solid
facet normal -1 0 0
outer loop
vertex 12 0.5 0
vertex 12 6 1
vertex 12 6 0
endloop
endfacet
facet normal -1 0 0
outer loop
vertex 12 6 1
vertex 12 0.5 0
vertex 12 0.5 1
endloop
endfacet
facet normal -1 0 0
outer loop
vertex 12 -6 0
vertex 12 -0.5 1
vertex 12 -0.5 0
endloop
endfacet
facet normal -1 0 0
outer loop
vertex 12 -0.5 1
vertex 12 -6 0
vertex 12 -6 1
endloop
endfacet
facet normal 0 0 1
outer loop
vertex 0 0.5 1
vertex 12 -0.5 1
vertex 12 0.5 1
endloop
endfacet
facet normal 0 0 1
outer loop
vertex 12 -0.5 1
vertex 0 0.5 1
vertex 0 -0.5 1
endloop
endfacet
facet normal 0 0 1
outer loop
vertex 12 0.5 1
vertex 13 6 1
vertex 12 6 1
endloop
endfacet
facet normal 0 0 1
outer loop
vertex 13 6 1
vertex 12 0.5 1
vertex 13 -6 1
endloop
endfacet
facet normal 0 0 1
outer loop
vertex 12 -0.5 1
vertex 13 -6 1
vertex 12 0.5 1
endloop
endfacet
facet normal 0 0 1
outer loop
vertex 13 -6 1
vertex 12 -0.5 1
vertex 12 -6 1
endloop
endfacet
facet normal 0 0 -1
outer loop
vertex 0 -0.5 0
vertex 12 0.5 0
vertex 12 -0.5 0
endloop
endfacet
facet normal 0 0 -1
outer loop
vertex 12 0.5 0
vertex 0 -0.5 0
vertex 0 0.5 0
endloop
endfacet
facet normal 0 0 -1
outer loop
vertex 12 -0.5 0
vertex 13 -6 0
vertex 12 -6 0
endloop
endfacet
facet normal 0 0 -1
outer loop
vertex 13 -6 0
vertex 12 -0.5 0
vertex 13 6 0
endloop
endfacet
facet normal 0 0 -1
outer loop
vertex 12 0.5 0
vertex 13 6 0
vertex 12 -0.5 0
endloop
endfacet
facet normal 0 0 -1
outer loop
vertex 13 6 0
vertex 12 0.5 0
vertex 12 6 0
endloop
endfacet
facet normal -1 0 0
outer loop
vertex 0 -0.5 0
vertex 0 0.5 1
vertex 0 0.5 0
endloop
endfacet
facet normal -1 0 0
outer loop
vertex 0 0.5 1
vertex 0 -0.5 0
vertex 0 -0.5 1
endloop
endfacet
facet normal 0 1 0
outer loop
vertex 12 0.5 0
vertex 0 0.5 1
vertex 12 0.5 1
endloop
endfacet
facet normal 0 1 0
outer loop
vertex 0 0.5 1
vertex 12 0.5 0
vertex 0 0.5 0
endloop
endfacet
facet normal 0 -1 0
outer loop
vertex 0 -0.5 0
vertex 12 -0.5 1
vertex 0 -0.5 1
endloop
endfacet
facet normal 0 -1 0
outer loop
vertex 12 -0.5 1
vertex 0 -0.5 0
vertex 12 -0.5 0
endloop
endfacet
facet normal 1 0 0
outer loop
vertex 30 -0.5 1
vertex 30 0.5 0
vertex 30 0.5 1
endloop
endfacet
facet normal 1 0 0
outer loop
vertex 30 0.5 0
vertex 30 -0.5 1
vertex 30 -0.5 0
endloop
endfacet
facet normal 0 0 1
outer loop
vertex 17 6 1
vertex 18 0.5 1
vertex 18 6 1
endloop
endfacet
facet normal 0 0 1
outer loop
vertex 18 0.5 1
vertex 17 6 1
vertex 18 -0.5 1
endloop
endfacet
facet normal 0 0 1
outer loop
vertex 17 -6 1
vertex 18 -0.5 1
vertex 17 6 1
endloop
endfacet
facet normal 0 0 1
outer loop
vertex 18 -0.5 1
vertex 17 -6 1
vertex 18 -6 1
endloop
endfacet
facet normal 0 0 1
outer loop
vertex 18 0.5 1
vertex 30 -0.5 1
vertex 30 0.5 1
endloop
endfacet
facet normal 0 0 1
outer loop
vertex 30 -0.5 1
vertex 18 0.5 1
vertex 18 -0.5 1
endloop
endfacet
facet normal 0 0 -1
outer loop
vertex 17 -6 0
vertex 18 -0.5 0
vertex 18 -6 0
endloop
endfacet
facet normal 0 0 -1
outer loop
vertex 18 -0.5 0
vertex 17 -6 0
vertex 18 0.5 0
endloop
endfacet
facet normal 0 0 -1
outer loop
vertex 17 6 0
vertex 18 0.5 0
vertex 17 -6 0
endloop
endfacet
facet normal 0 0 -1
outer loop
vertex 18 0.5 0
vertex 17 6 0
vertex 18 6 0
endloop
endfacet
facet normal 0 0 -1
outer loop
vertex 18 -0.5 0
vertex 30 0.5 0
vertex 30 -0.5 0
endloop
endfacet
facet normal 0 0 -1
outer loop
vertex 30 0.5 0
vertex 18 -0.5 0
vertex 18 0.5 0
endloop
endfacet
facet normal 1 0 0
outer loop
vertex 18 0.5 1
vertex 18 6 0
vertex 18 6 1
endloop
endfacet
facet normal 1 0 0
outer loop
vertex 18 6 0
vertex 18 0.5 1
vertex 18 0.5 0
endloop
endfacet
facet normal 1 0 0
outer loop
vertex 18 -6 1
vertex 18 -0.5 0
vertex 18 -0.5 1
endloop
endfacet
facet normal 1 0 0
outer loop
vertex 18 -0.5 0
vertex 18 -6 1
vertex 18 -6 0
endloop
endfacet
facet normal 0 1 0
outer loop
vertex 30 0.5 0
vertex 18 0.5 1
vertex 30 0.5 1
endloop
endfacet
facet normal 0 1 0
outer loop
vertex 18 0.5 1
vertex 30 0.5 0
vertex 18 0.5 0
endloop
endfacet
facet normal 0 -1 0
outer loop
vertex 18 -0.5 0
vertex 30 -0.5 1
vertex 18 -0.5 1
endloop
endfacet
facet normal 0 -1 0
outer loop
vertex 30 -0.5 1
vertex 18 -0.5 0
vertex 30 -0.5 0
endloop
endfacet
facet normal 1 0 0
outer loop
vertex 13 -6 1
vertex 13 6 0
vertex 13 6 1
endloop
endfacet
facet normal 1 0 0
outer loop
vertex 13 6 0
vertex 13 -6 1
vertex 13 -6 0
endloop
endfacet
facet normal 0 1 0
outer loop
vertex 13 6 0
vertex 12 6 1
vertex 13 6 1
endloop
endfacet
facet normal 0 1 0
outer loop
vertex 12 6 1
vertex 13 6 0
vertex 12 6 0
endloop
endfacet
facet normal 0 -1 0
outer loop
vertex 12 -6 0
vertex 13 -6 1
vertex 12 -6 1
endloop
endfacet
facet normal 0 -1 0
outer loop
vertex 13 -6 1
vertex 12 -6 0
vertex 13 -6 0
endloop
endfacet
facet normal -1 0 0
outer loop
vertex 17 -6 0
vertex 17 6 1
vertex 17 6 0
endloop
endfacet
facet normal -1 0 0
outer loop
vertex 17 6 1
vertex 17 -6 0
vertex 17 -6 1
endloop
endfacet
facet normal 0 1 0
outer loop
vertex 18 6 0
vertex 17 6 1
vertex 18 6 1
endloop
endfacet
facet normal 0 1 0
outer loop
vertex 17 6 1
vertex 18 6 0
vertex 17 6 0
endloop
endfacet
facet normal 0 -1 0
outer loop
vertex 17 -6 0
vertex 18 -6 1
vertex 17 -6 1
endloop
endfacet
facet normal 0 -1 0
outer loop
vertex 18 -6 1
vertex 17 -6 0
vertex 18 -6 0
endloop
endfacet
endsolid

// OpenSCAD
module capacitor(length, width, thickness, height)
{
    translate([0,-thickness/2,0])cube([length/2-width/4, thickness, height]);
    
    translate([(length/2+width/4),-thickness/2,0])cube([(length/2-width/4), thickness, height]);
    
    translate([(length-width/2)/2,-width/2, 0])cube([thickness, width, height]);
    
    translate([(length+width/2)/2-thickness,-width/2, 0])cube([thickness, width, height]);
}

capacitor(30, 12, 1, 1);
